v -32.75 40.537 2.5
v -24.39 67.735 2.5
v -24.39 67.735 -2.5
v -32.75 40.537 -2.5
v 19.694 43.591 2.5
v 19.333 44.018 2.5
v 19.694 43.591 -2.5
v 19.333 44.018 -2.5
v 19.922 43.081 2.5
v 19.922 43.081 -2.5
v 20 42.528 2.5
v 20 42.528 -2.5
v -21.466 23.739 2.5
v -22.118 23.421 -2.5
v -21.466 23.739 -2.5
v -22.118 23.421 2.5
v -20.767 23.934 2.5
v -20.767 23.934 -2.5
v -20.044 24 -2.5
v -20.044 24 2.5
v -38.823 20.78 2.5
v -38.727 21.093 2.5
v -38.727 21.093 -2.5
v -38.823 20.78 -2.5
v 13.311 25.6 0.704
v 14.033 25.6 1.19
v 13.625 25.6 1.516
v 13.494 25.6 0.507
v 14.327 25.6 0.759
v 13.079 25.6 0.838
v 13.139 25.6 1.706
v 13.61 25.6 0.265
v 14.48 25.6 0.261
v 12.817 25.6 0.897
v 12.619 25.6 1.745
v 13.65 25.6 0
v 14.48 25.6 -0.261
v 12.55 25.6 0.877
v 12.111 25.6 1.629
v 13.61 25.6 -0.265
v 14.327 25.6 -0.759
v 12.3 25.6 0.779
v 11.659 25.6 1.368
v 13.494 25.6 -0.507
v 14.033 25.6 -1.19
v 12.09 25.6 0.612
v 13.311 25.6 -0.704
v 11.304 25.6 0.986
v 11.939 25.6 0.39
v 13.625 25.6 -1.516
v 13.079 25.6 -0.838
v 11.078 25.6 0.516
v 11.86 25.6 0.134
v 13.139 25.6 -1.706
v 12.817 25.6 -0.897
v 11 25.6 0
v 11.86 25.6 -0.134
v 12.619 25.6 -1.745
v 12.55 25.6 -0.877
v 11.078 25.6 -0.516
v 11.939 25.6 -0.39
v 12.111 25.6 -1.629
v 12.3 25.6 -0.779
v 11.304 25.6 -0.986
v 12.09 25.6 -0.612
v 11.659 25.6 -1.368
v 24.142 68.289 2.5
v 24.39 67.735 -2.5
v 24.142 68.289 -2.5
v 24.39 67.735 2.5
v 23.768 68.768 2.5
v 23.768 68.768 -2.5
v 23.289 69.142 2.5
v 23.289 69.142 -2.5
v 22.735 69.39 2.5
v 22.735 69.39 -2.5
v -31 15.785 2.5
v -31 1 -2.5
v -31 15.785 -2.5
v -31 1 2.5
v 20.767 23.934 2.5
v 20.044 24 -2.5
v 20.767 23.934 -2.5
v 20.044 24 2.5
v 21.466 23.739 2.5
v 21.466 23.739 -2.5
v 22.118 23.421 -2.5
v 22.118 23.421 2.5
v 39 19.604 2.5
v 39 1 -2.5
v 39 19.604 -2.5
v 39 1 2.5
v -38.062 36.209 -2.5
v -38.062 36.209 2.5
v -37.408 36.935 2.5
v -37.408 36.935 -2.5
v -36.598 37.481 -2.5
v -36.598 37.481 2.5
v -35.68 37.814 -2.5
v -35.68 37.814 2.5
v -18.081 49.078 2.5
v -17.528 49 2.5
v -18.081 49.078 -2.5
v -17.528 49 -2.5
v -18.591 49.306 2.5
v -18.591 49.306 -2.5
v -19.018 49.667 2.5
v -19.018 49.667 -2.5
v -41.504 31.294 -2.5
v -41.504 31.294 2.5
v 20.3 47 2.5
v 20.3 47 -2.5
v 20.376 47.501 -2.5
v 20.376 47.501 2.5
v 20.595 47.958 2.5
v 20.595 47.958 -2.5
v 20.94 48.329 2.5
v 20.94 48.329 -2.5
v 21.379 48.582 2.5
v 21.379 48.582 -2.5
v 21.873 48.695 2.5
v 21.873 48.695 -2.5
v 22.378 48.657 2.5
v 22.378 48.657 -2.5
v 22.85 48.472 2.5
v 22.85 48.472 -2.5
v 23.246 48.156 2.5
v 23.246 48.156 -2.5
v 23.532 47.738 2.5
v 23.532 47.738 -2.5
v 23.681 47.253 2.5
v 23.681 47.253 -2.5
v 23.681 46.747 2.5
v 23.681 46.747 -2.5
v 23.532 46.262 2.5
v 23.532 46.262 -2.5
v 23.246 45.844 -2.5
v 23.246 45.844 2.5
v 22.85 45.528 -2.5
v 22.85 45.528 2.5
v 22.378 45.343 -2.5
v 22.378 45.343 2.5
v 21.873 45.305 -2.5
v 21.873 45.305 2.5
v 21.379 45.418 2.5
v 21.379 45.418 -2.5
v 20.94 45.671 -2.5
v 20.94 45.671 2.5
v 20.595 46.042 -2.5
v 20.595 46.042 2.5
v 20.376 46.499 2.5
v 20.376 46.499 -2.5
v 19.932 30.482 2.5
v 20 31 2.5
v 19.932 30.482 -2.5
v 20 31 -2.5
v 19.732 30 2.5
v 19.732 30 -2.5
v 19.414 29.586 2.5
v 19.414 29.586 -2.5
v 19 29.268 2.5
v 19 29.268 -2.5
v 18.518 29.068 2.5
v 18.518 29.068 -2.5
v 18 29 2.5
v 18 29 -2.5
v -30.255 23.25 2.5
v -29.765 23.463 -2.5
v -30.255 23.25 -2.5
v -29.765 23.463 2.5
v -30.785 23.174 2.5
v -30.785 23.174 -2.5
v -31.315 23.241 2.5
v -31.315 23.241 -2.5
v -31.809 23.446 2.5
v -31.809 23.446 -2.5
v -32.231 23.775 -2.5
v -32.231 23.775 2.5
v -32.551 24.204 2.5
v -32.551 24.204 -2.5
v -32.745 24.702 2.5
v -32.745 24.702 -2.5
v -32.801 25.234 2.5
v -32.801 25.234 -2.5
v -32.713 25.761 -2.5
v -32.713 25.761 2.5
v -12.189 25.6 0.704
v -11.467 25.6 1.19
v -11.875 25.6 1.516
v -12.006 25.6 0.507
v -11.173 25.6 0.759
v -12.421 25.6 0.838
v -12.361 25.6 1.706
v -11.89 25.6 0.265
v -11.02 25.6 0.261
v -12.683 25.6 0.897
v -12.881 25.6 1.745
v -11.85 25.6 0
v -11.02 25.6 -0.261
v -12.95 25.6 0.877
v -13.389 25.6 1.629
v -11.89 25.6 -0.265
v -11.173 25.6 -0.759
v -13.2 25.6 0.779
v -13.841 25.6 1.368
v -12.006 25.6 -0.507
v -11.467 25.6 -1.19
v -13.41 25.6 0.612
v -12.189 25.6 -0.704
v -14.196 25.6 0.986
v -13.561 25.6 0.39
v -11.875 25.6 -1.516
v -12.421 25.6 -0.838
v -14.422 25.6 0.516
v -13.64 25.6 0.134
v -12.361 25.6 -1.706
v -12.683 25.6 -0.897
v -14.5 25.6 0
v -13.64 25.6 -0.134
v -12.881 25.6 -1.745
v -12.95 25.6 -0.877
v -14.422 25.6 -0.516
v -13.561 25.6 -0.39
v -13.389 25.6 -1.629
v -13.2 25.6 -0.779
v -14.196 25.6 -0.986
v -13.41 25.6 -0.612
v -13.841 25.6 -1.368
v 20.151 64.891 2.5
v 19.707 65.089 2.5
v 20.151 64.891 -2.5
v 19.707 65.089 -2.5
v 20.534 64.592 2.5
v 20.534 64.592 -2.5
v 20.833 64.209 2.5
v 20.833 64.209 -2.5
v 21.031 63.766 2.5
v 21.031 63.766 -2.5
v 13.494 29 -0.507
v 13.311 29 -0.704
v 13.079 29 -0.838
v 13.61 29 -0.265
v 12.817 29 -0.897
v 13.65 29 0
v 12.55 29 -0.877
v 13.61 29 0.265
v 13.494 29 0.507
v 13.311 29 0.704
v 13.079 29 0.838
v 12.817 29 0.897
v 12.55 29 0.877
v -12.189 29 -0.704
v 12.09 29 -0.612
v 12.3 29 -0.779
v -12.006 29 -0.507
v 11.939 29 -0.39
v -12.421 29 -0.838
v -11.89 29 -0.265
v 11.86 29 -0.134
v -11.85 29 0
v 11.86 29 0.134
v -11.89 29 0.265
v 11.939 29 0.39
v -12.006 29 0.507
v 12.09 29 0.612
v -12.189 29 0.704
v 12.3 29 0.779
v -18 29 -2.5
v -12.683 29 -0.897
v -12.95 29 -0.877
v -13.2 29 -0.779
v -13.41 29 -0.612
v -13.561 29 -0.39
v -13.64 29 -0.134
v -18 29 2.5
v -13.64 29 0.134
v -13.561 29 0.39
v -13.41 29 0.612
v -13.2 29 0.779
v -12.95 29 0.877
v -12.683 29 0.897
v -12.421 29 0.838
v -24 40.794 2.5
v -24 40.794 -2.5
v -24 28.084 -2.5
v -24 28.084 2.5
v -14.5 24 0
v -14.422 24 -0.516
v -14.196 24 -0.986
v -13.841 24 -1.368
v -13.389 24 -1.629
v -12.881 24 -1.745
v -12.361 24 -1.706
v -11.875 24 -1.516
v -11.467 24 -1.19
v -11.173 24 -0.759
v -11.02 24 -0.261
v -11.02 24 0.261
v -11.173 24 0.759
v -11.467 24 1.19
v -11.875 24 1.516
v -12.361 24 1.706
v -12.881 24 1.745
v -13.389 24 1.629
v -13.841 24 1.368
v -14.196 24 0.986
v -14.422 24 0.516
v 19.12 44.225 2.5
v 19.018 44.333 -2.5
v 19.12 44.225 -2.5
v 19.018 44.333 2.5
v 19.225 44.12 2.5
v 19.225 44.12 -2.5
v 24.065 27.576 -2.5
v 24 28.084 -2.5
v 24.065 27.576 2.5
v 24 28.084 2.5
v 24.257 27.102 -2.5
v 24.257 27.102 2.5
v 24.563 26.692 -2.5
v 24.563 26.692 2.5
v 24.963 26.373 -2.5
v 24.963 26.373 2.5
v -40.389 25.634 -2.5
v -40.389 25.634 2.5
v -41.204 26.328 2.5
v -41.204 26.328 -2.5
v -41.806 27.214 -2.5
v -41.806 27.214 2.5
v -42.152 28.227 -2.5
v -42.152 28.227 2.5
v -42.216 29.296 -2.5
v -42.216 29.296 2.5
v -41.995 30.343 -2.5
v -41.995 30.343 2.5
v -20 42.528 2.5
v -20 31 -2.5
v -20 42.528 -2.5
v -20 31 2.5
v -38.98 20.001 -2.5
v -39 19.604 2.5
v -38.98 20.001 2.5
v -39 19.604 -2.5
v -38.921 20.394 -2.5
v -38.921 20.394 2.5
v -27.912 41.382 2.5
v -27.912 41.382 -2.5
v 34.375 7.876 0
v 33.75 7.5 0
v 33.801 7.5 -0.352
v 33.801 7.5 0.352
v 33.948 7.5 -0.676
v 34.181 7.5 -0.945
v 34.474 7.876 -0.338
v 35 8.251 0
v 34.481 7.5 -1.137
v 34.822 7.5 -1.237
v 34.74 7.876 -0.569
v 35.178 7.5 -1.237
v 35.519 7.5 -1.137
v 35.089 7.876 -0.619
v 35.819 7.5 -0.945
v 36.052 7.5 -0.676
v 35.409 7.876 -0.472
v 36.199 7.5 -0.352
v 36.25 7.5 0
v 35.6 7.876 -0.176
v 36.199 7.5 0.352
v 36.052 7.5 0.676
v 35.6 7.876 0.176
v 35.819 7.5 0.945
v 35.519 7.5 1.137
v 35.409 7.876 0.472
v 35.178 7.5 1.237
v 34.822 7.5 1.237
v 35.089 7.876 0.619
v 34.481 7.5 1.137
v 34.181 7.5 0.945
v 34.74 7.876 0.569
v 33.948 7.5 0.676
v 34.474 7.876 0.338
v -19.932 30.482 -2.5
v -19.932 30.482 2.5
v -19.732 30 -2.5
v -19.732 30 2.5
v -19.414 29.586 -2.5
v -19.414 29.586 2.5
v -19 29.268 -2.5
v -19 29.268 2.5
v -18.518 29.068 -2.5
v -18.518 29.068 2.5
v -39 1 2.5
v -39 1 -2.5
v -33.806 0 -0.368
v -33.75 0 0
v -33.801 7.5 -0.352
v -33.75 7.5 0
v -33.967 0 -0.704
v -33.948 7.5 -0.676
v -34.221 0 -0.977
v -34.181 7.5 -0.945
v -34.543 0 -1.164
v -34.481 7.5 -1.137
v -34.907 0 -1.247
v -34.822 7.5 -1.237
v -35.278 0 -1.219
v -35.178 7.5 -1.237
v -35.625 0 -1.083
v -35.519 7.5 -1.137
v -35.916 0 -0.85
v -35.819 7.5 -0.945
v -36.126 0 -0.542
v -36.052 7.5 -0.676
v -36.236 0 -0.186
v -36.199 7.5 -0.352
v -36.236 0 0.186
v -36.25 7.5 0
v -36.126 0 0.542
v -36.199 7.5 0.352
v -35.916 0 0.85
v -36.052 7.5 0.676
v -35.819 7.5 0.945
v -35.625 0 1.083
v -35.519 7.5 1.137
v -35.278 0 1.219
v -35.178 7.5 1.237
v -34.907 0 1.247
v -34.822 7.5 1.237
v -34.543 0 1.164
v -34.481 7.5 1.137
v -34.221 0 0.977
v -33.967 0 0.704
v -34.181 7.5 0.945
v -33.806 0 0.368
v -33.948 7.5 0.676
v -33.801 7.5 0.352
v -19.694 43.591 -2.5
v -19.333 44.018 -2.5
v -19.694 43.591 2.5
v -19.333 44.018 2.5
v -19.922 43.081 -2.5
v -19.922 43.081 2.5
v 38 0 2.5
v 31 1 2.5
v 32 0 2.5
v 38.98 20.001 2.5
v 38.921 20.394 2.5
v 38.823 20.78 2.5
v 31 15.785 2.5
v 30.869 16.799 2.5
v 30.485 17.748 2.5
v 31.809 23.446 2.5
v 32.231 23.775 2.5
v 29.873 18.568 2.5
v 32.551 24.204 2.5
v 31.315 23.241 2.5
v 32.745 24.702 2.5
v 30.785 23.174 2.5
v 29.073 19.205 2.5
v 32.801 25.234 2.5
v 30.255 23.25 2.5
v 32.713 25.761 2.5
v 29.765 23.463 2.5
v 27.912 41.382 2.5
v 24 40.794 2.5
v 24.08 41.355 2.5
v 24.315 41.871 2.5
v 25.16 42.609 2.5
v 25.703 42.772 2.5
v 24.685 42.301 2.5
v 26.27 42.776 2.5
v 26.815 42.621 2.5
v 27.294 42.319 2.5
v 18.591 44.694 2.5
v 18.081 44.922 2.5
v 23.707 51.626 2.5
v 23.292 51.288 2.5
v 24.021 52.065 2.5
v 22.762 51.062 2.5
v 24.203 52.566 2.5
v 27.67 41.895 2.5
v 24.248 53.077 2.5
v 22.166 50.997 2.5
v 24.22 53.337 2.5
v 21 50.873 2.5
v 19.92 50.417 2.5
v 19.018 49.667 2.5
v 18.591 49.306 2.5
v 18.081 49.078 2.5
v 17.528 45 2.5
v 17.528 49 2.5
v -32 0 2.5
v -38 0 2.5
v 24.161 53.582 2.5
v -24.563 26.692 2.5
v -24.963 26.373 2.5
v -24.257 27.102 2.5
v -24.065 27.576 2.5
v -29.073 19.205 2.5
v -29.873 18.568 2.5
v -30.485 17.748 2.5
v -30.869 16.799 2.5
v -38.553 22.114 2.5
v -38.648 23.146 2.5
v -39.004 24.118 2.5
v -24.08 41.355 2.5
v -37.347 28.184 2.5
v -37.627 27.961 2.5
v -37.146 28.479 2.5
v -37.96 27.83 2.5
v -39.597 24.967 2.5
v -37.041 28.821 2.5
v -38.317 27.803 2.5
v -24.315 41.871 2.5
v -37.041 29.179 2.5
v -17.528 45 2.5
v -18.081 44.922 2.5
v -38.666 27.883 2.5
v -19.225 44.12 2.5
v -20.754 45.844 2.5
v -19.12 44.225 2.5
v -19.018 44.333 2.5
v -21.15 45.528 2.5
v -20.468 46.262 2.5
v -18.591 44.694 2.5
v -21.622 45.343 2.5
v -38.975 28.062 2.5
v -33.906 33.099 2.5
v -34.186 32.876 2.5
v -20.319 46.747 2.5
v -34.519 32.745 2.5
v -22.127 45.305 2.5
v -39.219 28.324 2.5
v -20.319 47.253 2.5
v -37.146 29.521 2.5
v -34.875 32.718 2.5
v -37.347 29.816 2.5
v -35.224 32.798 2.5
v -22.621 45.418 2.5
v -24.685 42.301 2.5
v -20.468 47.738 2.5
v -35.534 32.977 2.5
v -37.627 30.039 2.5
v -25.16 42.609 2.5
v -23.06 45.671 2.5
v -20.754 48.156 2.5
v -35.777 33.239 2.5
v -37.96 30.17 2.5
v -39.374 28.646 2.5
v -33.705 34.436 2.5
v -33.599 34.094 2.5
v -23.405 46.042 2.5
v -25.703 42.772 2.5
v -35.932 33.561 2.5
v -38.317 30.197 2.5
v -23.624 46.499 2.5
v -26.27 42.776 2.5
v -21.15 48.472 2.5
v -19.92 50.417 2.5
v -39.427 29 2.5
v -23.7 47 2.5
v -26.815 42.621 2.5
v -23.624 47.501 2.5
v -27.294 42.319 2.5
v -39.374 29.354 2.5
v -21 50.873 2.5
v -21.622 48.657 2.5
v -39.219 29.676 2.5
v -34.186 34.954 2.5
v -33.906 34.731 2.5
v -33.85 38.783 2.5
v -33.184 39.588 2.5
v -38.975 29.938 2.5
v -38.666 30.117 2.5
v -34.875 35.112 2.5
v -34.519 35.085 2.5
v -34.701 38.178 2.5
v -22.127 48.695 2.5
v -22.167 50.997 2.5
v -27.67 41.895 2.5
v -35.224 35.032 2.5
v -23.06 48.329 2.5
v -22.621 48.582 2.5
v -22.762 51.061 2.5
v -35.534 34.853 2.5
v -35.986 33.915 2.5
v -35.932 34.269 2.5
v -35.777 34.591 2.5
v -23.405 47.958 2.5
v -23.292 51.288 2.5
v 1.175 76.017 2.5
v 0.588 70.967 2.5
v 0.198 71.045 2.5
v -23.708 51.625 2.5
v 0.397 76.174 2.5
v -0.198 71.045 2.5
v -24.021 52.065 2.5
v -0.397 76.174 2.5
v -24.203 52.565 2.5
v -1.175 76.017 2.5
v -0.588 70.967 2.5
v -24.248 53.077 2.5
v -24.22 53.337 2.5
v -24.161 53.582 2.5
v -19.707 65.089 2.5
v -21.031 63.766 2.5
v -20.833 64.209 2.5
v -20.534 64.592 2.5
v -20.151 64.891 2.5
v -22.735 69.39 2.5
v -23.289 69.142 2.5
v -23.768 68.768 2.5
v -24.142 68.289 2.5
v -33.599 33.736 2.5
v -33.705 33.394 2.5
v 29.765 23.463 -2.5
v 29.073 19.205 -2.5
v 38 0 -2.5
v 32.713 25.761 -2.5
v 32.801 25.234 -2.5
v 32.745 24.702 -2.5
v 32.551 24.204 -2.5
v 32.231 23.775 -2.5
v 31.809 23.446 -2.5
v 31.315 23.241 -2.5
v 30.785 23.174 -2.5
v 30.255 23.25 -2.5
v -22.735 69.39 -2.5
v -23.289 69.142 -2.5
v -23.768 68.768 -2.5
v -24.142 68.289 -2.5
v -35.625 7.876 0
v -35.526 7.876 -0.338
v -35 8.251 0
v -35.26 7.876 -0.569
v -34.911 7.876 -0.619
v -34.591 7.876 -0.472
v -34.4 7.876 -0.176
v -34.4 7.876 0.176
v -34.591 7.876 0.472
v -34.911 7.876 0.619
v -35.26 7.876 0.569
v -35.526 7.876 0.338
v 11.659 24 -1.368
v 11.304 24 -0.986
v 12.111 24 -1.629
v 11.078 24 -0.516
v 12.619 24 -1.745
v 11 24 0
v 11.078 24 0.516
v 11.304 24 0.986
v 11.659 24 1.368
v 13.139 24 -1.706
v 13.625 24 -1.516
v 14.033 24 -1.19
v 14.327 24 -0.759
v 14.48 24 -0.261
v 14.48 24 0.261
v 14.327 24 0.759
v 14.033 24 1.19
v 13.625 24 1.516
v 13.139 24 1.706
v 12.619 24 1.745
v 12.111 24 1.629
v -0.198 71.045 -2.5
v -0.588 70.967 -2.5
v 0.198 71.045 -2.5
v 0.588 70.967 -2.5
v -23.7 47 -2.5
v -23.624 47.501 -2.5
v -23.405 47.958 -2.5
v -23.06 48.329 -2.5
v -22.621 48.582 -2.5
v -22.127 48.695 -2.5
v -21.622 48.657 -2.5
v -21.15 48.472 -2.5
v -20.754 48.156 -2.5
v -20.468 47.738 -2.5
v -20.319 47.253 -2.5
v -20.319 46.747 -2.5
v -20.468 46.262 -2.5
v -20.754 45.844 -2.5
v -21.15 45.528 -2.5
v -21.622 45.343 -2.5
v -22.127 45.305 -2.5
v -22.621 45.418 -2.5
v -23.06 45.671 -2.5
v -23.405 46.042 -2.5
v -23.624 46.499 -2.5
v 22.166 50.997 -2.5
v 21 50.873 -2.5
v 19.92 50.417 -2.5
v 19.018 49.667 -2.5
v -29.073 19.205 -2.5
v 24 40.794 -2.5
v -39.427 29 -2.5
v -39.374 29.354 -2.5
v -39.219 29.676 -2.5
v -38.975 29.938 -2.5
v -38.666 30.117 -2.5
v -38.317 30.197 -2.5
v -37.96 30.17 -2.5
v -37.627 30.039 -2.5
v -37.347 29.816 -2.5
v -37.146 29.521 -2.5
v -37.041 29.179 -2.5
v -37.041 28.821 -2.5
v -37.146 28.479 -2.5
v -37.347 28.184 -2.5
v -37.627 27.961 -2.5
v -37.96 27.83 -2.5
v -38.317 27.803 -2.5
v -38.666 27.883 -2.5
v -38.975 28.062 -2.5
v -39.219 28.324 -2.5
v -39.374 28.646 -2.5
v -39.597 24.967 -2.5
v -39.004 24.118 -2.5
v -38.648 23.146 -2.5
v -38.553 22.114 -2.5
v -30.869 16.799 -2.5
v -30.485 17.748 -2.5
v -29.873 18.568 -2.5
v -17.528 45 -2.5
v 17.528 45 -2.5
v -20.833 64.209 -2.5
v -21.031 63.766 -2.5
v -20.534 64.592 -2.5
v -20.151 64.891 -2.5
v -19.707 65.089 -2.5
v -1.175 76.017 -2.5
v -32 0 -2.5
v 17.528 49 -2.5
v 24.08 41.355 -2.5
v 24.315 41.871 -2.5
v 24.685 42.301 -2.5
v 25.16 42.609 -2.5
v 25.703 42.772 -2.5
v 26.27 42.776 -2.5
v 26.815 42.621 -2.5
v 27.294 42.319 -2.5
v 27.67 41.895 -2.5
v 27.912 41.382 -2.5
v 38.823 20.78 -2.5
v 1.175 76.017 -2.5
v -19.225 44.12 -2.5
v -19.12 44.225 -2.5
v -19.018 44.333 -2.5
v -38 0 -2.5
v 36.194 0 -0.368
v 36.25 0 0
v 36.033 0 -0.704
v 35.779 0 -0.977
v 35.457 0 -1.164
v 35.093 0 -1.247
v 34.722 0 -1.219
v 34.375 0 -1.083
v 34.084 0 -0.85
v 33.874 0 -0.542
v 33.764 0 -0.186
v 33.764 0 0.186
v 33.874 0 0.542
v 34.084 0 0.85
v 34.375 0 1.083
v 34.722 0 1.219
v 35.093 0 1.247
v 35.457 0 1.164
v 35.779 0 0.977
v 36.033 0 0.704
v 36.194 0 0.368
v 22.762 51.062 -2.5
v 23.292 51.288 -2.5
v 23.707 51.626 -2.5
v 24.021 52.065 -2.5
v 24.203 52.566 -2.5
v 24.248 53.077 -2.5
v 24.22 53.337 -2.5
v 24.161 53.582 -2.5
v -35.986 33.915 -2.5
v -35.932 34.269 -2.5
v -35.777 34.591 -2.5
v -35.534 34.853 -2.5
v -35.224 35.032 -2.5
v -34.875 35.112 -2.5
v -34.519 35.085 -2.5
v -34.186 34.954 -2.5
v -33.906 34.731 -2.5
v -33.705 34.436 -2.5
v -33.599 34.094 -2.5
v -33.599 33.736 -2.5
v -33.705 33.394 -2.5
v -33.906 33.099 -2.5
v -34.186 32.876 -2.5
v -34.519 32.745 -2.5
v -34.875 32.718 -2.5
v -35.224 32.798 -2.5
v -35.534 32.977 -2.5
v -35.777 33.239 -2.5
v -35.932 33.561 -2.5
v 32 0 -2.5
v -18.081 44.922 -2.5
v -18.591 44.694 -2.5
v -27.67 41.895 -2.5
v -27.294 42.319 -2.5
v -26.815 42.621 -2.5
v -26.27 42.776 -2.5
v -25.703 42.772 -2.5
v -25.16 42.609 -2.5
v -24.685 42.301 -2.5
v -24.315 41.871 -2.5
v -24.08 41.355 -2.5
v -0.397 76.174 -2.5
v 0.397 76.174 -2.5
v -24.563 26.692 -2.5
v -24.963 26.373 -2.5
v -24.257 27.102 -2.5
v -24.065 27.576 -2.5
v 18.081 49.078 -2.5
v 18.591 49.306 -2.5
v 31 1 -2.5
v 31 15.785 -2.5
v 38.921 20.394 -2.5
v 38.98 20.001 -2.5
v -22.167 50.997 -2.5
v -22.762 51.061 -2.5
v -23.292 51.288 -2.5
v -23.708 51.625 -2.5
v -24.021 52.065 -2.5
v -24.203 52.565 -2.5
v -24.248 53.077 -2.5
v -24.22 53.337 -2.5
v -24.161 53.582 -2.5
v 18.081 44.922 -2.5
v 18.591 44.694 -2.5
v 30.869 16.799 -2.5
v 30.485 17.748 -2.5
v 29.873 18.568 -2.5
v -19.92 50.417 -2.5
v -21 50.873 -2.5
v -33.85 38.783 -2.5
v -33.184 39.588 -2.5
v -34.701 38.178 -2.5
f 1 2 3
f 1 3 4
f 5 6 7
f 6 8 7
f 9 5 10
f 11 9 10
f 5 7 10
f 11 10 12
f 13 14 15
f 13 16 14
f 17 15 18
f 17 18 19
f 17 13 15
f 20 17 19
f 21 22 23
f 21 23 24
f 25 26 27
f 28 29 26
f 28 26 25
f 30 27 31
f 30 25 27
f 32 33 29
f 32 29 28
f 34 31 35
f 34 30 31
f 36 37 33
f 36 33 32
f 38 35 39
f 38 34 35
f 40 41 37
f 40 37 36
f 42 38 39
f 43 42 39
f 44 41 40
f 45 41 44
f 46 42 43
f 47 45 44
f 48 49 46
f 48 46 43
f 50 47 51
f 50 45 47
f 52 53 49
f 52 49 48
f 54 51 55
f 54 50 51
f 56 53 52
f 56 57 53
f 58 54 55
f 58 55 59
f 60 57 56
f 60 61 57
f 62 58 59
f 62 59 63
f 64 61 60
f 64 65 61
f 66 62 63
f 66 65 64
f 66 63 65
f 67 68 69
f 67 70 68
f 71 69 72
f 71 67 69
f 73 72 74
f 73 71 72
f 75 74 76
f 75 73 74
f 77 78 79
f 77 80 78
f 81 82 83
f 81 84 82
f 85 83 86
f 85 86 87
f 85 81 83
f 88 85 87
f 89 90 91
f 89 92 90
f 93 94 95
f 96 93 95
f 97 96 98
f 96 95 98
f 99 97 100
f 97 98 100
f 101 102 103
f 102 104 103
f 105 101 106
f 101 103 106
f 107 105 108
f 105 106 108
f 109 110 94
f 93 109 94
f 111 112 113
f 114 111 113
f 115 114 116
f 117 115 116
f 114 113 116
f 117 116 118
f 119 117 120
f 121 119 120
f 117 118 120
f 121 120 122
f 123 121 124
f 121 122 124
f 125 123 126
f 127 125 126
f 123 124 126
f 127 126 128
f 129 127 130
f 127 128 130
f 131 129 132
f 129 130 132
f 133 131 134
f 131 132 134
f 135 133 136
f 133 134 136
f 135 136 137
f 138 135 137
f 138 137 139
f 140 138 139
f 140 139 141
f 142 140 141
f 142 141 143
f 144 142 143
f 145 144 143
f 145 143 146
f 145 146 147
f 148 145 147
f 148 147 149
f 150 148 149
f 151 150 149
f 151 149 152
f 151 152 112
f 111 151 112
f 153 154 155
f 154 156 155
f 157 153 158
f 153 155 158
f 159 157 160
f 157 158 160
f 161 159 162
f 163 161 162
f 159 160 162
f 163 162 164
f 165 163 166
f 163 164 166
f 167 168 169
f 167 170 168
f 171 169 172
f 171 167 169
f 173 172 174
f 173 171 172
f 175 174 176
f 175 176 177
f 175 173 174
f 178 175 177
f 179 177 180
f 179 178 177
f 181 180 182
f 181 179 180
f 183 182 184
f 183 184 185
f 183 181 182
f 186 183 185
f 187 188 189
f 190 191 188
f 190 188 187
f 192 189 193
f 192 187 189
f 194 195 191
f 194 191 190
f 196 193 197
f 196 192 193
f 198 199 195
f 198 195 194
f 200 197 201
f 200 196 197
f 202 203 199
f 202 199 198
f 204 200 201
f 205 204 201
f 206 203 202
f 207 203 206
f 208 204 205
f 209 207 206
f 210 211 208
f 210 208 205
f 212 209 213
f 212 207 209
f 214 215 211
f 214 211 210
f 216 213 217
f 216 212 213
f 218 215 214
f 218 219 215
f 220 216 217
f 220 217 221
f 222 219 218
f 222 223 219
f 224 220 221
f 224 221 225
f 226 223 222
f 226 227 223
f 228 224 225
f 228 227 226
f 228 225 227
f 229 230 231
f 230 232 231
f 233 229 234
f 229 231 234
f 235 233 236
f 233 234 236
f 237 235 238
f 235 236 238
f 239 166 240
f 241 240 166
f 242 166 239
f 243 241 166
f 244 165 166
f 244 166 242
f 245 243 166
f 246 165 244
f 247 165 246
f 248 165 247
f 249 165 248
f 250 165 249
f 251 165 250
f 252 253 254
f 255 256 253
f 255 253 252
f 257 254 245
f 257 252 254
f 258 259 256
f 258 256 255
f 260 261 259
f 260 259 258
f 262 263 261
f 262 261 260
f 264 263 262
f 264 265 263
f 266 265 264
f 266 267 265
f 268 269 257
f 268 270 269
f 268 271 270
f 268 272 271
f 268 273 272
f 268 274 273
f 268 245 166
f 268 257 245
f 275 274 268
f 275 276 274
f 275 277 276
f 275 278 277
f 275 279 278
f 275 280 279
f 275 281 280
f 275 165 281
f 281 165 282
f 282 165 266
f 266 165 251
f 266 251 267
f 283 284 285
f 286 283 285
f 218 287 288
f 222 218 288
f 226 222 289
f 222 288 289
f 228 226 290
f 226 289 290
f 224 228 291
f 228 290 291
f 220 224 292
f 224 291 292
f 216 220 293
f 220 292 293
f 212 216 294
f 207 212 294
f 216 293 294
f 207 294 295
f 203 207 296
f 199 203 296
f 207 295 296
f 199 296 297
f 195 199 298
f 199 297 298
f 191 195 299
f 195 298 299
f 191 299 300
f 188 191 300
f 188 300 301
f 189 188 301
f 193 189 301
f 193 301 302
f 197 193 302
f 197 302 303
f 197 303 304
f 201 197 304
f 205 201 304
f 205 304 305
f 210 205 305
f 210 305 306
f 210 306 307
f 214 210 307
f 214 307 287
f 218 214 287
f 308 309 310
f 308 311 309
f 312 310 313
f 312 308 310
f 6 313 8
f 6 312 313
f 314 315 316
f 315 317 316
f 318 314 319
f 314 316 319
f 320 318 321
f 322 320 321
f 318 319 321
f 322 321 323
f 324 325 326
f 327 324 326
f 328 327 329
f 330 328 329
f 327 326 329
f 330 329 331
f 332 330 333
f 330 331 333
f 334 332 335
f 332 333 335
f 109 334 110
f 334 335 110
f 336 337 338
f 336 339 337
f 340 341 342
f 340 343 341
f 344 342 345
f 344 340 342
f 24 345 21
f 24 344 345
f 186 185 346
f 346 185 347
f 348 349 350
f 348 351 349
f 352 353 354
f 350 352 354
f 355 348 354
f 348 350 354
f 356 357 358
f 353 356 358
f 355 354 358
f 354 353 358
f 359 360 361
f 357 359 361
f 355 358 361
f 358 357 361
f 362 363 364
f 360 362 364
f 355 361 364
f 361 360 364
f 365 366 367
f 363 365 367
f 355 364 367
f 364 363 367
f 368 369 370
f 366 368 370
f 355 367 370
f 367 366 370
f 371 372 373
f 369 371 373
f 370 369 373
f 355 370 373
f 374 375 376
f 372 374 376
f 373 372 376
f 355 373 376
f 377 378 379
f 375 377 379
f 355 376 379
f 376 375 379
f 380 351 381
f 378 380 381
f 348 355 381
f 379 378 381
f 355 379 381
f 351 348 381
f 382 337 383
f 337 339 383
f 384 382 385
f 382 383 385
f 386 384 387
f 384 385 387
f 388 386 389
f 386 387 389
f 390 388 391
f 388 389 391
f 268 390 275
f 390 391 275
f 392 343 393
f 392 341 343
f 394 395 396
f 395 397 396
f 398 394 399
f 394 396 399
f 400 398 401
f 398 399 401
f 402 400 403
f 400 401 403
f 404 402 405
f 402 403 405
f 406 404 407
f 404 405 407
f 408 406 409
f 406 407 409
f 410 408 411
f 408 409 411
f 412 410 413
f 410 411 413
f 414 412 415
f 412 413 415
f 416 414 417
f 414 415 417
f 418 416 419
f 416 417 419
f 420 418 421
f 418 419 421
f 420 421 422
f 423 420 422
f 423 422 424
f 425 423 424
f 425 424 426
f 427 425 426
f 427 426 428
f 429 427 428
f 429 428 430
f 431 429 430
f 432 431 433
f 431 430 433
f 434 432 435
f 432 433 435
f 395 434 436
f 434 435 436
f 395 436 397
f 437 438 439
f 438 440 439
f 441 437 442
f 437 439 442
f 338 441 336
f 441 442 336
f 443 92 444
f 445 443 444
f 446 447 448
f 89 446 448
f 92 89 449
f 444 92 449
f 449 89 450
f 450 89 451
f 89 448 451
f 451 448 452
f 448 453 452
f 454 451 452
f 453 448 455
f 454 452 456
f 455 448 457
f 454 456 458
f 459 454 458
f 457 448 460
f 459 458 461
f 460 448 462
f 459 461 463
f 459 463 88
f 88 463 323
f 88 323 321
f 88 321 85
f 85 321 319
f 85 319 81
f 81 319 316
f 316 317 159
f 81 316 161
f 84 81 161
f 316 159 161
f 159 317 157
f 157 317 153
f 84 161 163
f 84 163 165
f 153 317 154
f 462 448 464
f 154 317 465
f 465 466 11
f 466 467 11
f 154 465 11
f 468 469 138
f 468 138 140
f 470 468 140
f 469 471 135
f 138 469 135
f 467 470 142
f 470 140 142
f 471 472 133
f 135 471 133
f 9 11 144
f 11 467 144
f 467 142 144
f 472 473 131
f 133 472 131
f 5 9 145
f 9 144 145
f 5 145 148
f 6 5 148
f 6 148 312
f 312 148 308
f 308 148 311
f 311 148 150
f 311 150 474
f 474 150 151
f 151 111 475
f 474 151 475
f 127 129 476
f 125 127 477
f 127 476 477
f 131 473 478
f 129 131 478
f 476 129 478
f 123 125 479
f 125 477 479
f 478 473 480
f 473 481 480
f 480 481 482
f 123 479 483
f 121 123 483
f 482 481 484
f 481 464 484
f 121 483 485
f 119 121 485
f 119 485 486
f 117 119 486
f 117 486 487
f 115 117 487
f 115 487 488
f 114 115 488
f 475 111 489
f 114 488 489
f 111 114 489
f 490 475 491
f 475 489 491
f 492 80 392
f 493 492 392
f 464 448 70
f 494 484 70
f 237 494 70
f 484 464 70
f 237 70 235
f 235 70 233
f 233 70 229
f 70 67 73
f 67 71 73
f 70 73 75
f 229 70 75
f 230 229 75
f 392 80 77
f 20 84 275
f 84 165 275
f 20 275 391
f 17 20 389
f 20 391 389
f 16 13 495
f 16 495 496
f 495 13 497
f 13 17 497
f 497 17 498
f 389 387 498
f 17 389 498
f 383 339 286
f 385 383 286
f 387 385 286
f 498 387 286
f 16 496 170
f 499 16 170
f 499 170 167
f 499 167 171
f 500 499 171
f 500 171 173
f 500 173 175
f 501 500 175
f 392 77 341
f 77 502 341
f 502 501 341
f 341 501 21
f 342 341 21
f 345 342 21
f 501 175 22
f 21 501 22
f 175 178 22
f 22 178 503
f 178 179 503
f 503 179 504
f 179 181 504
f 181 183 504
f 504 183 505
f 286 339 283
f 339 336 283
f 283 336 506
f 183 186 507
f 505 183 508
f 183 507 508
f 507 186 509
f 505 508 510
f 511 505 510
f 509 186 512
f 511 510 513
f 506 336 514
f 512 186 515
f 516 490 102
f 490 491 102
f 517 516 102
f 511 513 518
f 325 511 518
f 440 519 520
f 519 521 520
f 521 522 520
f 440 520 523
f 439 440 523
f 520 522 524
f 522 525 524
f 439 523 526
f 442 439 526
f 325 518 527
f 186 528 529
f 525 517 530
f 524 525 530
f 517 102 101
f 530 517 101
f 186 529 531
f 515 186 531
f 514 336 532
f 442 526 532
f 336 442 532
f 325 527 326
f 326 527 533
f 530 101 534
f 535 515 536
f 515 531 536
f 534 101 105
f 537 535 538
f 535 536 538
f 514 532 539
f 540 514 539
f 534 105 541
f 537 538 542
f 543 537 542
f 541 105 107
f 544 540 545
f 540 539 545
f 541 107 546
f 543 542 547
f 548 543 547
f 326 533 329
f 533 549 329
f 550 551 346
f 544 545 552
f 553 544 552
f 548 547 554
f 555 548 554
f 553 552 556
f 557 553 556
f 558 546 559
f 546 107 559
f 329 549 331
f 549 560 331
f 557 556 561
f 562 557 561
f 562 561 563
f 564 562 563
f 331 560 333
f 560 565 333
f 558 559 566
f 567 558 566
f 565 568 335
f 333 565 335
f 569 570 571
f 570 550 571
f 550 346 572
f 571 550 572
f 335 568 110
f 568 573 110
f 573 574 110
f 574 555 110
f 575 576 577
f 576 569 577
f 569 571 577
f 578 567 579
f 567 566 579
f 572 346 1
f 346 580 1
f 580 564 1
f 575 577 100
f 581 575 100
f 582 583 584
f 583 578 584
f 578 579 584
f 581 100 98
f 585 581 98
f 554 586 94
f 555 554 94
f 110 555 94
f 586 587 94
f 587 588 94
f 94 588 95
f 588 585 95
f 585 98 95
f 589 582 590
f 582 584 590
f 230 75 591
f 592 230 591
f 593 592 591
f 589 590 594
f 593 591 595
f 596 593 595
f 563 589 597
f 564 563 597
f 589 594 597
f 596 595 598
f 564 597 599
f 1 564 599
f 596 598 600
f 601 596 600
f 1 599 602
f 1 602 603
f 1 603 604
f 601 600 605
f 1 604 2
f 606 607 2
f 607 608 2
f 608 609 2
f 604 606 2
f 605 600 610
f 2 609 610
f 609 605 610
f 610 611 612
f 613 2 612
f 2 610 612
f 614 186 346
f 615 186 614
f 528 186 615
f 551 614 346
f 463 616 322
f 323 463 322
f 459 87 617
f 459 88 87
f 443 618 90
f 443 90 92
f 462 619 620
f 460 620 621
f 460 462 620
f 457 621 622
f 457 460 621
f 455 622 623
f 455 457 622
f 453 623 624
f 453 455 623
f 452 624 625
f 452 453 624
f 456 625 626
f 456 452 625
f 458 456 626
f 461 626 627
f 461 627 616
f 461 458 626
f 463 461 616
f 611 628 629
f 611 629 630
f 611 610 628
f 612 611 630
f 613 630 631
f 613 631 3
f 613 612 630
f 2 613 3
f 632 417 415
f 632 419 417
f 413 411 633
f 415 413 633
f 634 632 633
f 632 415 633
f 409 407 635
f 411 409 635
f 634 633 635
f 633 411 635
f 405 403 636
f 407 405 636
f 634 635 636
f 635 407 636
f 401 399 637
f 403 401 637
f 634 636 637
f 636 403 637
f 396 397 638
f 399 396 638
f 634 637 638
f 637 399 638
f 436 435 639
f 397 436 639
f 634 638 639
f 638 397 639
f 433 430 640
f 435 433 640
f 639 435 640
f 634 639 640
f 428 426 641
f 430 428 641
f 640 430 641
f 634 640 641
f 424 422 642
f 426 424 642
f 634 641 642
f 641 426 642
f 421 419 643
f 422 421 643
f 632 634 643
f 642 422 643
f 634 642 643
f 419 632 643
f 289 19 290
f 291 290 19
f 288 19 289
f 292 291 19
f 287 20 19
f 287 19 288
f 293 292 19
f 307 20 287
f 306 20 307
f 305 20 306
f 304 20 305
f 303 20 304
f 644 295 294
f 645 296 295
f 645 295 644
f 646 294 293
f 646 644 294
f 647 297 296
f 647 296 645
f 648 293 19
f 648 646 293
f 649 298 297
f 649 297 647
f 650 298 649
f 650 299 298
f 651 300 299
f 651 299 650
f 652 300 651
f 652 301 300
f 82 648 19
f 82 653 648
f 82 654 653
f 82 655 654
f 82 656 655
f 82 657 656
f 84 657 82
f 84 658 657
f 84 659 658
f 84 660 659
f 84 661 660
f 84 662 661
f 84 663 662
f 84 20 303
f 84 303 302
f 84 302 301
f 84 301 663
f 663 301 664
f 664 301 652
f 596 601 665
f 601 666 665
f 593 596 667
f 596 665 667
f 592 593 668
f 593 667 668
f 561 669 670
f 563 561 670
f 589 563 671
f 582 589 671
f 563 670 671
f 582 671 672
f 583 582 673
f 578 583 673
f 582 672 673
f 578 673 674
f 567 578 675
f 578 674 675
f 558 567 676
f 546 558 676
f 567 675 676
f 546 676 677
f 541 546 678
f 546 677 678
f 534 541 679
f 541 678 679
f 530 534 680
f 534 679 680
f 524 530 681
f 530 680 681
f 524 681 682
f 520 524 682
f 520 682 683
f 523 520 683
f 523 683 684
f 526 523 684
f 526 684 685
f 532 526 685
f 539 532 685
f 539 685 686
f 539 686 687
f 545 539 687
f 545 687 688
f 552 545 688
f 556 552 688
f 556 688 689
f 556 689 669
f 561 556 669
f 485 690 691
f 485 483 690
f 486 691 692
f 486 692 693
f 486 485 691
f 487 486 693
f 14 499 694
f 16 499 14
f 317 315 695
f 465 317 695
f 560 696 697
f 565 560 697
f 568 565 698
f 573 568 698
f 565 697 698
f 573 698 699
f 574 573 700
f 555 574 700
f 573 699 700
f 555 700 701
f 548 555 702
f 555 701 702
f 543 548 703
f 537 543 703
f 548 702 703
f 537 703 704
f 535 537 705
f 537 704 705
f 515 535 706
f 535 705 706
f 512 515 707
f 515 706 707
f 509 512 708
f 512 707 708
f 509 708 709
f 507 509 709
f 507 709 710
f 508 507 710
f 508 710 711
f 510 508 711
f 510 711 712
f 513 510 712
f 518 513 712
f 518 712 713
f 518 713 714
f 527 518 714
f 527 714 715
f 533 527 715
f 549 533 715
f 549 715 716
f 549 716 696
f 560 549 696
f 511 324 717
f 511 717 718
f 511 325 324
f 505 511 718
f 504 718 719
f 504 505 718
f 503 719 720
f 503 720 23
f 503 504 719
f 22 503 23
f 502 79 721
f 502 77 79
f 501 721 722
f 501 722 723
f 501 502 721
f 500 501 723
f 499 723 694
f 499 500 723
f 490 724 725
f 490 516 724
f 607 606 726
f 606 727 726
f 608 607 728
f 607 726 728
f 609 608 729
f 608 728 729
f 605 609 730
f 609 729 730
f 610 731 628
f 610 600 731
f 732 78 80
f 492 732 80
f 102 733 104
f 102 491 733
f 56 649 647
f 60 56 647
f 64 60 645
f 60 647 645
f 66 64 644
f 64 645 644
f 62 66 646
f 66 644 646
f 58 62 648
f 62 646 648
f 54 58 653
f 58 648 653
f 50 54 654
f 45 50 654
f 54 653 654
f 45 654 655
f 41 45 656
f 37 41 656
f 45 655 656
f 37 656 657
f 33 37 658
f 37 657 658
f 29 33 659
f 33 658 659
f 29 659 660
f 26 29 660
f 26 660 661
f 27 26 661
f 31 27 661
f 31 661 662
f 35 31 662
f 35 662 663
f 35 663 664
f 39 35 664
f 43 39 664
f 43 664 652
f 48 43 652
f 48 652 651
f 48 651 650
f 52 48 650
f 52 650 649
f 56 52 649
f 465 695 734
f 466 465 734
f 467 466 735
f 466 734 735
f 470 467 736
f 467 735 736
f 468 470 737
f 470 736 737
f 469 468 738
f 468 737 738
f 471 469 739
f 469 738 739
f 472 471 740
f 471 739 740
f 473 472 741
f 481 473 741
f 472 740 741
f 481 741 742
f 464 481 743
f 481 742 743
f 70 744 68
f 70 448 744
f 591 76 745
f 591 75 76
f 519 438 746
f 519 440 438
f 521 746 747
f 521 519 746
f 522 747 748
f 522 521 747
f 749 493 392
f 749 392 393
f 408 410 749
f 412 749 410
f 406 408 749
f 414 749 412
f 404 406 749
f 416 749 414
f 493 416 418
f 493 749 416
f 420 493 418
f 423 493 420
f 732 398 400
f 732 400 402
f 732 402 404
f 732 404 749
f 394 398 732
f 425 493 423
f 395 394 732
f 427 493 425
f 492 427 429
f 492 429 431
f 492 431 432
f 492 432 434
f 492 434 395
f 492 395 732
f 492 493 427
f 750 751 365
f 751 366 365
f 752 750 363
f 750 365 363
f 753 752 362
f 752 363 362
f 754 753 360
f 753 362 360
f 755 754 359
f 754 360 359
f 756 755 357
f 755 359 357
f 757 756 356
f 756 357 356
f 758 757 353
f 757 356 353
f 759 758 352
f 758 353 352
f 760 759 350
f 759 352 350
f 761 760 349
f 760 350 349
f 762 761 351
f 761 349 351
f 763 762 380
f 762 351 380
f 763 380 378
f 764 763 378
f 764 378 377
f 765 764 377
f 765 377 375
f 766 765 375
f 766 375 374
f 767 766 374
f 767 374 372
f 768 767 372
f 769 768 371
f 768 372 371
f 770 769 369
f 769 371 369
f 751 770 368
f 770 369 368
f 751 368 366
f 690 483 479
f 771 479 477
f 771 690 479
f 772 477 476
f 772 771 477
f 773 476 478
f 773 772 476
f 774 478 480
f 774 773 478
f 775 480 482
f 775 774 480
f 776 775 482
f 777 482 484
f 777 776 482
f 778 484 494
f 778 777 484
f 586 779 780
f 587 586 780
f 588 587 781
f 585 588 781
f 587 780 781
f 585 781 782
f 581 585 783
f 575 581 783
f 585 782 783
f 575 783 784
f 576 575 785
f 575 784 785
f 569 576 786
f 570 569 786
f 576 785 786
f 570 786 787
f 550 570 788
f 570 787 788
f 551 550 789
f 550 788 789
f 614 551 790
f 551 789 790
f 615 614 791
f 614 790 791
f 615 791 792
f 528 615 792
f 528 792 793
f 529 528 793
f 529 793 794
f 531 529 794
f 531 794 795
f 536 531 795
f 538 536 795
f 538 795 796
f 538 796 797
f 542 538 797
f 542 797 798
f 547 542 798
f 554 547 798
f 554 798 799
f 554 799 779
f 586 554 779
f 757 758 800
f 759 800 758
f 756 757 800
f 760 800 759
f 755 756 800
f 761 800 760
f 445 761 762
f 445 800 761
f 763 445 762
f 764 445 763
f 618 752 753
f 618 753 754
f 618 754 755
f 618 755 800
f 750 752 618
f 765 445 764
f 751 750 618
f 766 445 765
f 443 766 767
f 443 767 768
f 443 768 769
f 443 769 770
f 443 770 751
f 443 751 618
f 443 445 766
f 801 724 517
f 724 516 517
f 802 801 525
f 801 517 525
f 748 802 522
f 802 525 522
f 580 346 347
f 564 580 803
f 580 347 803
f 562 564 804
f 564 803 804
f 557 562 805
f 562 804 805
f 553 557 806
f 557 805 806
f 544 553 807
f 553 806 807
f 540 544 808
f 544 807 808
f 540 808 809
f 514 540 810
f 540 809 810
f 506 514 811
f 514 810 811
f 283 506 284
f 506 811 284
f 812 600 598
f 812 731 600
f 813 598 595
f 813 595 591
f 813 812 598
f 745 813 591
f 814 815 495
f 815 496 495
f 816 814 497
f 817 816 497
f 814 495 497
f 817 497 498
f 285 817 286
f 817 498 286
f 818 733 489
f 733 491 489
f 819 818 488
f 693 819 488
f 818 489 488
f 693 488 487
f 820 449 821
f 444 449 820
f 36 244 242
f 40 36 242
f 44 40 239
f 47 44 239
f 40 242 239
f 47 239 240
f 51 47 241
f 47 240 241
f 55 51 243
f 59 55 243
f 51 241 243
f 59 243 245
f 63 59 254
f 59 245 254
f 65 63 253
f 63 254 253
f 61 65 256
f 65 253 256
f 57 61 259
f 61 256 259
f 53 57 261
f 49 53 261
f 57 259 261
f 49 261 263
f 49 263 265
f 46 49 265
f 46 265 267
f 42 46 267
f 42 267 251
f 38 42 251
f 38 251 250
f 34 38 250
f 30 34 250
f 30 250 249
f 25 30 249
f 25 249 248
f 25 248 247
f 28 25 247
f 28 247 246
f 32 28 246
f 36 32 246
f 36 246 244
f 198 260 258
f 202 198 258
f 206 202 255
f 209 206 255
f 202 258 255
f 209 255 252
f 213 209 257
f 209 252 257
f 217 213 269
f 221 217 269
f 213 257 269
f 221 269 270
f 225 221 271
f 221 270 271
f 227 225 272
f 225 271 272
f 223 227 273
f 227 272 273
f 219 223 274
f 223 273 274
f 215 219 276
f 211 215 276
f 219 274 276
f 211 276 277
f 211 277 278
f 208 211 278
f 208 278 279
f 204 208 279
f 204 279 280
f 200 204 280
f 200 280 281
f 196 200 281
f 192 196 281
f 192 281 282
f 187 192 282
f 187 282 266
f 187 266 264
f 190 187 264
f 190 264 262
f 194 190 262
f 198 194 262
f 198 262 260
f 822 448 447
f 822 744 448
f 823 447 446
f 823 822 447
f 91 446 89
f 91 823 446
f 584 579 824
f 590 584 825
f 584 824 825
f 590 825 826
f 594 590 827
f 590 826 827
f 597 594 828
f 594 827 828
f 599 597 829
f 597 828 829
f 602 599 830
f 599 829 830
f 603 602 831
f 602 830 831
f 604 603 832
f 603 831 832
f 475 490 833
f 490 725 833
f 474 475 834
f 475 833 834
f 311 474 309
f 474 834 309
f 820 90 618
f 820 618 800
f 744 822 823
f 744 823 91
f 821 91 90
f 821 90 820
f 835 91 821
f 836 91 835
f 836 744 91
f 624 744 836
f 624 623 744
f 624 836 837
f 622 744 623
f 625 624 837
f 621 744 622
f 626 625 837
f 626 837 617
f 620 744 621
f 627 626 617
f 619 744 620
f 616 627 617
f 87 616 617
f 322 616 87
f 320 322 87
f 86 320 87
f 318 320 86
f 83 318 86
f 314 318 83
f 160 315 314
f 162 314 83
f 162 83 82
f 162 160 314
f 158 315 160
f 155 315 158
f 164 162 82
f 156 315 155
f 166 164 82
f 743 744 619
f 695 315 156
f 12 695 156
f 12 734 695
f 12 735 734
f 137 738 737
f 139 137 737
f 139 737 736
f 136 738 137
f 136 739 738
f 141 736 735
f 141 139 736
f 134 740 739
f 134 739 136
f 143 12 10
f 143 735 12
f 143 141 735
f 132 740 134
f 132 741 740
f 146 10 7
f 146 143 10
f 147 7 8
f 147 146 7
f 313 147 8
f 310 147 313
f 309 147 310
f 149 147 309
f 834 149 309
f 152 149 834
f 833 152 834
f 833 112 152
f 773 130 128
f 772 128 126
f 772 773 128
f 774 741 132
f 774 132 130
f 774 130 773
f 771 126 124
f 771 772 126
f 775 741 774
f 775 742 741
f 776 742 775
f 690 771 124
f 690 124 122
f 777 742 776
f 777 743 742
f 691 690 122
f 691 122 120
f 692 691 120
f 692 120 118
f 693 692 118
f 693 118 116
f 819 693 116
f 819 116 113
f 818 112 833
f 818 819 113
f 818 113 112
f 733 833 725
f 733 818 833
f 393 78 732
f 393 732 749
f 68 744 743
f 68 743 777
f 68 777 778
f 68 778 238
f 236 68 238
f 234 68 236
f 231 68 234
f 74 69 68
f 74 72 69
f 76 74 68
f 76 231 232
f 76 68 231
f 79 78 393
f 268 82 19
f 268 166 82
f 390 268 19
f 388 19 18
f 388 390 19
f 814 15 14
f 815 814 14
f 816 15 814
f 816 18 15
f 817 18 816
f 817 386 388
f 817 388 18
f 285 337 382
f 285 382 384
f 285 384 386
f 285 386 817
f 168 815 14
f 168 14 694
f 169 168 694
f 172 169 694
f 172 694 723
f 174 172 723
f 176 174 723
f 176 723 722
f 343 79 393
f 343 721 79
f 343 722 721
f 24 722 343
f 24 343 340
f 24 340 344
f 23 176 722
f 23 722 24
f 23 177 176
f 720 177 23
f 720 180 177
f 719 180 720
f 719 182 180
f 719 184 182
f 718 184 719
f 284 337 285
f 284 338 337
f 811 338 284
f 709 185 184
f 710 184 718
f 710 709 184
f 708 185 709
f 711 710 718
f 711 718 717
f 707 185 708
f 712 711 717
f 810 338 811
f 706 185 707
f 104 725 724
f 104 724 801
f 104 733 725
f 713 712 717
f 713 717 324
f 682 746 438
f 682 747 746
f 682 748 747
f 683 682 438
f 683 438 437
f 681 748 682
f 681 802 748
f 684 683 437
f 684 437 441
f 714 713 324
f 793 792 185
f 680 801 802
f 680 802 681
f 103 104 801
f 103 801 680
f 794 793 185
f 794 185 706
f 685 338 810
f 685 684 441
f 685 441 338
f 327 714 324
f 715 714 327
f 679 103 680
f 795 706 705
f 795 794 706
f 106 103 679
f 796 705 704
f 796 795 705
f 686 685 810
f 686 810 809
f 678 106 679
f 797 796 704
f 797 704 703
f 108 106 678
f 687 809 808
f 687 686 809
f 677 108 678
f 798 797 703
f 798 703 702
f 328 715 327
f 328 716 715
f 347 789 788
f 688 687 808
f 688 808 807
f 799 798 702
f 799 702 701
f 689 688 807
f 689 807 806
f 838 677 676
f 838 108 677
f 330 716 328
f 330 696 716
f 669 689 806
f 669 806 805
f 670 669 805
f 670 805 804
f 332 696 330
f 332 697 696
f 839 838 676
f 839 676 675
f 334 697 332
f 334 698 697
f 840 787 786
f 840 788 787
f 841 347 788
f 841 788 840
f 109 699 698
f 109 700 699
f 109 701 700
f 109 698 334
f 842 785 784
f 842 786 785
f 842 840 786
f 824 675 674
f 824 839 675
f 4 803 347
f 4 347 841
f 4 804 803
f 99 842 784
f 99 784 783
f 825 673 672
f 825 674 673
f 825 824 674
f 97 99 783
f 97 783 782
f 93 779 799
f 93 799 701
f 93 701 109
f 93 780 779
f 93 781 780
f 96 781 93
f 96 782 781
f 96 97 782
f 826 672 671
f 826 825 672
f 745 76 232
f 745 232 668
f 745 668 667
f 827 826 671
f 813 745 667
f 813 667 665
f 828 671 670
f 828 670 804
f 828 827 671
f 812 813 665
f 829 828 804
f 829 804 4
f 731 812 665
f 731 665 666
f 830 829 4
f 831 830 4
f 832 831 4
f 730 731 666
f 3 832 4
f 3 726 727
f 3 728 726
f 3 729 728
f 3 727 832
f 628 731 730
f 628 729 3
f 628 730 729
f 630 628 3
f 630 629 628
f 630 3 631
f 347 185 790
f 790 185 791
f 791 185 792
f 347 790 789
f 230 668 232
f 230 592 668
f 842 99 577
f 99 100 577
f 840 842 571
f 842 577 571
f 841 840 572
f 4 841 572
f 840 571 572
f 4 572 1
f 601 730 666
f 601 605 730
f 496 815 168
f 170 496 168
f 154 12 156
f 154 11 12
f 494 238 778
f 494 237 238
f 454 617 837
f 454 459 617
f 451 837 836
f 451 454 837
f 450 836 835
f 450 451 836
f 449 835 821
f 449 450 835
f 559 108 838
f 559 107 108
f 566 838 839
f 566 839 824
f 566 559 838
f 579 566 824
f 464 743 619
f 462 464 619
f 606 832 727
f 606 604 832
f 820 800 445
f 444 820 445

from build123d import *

# Parameters (mm, degrees)
BOSS_EXTRUDE3_DEPTH              = 2.5
FILLET3_R                        = 2
CUT_EXTRUDE1_DEPTH               = 86.90473786
FILLET1_R                        = 2
FILLET2_R                        = 4
M3_CLEARANCE_HOLE1_D             = 3.4
M3X0_5_TAPPED_HOLE1_D            = 2.5
M3X0_5_TAPPED_HOLE1_DEPTH        = 7.5
M3X0_5_TAPPED_HOLE1_TIP          = 0.751075774
CHAMFER1_SIZE                    = 1
CBORE_FOR_M1_6_SHCS1_D           = 1.8
CBORE_FOR_M1_6_SHCS1_DEPTH       = 5
CBORE_FOR_M1_6_SHCS1_CBORE_D     = 3.5
CBORE_FOR_M1_6_SHCS1_CBORE_DEPTH = 1.6
BOSS_EXTRUDE4_DEPTH              = 5
FILLET4_R                        = 4
M2_CLEARANCE_HOLE1_D             = 2.4
M2_CLEARANCE_HOLE1_DEPTH         = 7.5
M2_CLEARANCE_HOLE1_TIP           = 0.721032743


with BuildPart() as part:
    # Sketch1 → Boss-Extrude3 (new, symmetric)
    with BuildSketch(Plane.XY):
        with BuildLine():
            Line((-39, 0), (-31, 0))
            Line((-31, 0), (-31, 18.037654982))
            Line((-31, 18.037654982), (-21.161883591, 24))
            Line((-21.161883591, 24), (21.161883591, 24))
            Line((21.161883591, 24), (31, 18.037654982))
            Line((31, 18.037654982), (31, 0))
            Line((31, 0), (39, 0))
            Line((39, 0), (39, 20.205165085))
            Line((39, 20.205165085), (24.389646385, 67.734568005))
            ThreePointArc((24.389646385, 67.734568005), (23.767766953, 68.767766953), (22.734568005, 69.389646385))
            Line((22.734568005, 69.389646385), (0, 76.378164175))
            Line((0, 76.378164175), (-22.734568005, 69.389646385))
            ThreePointArc((-22.734568005, 69.389646385), (-23.767766953, 68.767766953), (-24.389646385, 67.734568005))
            Line((-24.389646385, 67.734568005), (-39, 20.205165085))
            Line((-39, 20.205165085), (-39, 0))
        make_face()
        with BuildLine():
            Line((-20, 29), (-20, 43.535898385))
            ThreePointArc((-20, 43.535898385), (-19.171572875, 44.171572875), (-18.535898385, 45))
            Line((-18.535898385, 45), (18.535898385, 45))
            ThreePointArc((18.535898385, 45), (19.171572875, 44.171572875), (20, 43.535898385))
            Line((20, 43.535898385), (20, 29))
            Line((20, 29), (-20, 29))
        make_face(mode=Mode.SUBTRACT)
        with BuildLine():
            Line((18.535898385, 49), (-18.535898385, 49))
            ThreePointArc((-18.535898385, 49), (-22.449787583, 50.974630943), (-25.823434216, 48.175308809))
            Line((-25.823434216, 48.175308809), (-20.719808061, 64.77807629))
            Line((-20.719808061, 64.77807629), (0, 71.147264708))
            Line((0, 71.147264708), (20.719808061, 64.77807629))
            Line((20.719808061, 64.77807629), (25.823434216, 48.175308809))
            ThreePointArc((25.823434216, 48.175308809), (22.449787583, 50.974630943), (18.535898385, 49))
        make_face(mode=Mode.SUBTRACT)
    extrude(amount=BOSS_EXTRUDE3_DEPTH, both=True)

    # Fillet3
    fillet3_edges = [part.edges().sort_by_distance(p)[0] for p in [
        (-18.535898385, 45, 0),
        (-20, 43.535898385, 0),
        (-20, 29, 0),
        (20, 29, 0),
        (20, 43.535898385, 0),
        (18.535898385, 45, 0),
        (20.719808061, 64.77807629, 0),
        (0, 71.147264708, 0),
        (-20.719808061, 64.77807629, 0),
        (-25.823434216, 48.175308809, 0),
        (-18.535898385, 49, 0),
        (18.535898385, 49, 0),
    ]]
    fillet(fillet3_edges, radius=FILLET3_R - 0.0004)  # a hair under: the kernel refuses the full size
    fillet3_2_edges = [part.edges().sort_by_distance(p)[0] for p in [
        (25.823434216, 48.175308809, 0),
    ]]
    fillet(fillet3_2_edges, radius=FILLET3_R)

    # Sketch2 → Cut-Extrude1 (cut, through all)
    with BuildSketch(Plane(origin=(0, 0, -2.5), x_dir=(-1, 0, 0), z_dir=(0, 0, -1))):
        with BuildLine():
            Line((-27.911717108, 41.381849759), (-34.256545, 20.741289696))
            Line((-34.256545, 20.741289696), (-24, 26.957221429))
            Line((-24, 26.957221429), (-24, 40.794195355))
            ThreePointArc((-24, 40.794195355), (-25.702875629, 42.77200149), (-27.911717108, 41.381849759))
        make_face()
        with BuildLine():
            Line((24, 26.957221429), (34.256545, 20.741289696))
            Line((34.256545, 20.741289696), (27.911717108, 41.381849759))
            ThreePointArc((27.911717108, 41.381849759), (25.702875629, 42.77200149), (24, 40.794195355))
            Line((24, 40.794195355), (24, 26.957221429))
        make_face()
    extrude(amount=-CUT_EXTRUDE1_DEPTH, mode=Mode.SUBTRACT)

    # Fillet1
    fillet1_edges = [part.edges().sort_by_distance(p)[0] for p in [
        (24, 26.957221429, 0),
        (34.256545, 20.741289696, 0),
        (-34.256545, 20.741289696, 0),
        (-24, 26.957221429, 0),
    ]]
    fillet(fillet1_edges, radius=FILLET1_R)

    # Fillet2
    fillet2_edges = [part.edges().sort_by_distance(p)[0] for p in [
        (39, 20.205165085, 0),
        (31, 18.037654982, 0),
        (21.161883591, 24, 0),
        (-21.161883591, 24, 0),
        (-31, 18.037654982, 0),
        (-39, 20.205165085, 0),
        (0, 76.378164175, 0),
    ]]
    fillet(fillet2_edges, radius=FILLET2_R)

    # M3 Clearance Hole1 (through all)
    with Locations(Plane.XY.offset(2.5)):
        with Locations((-22, 47), (22, 47)):
            Hole(M3_CLEARANCE_HOLE1_D / 2)

    # M3x0.5 Tapped Hole1
    with Locations(Plane(origin=(0, 0, 0), x_dir=(-1, 0, 0), z_dir=(0, -1, 0))):
        with Locations((-35, 0), (35, 0)):
            Hole(M3X0_5_TAPPED_HOLE1_D / 2, depth=M3X0_5_TAPPED_HOLE1_DEPTH)
            with Locations((0, 0, -(M3X0_5_TAPPED_HOLE1_DEPTH + M3X0_5_TAPPED_HOLE1_TIP / 2))):  # 118° drill point
                Cone(0, M3X0_5_TAPPED_HOLE1_D / 2, M3X0_5_TAPPED_HOLE1_TIP, mode=Mode.SUBTRACT)

    # Chamfer1
    chamfer1_edges = [part.edges().sort_by_distance(p)[0] for p in [
        (39, 0, 0),
        (31, 0, 0),
        (-31, 0, 0),
        (-39, 0, 0),
    ]]
    chamfer(chamfer1_edges, length=CHAMFER1_SIZE)

    # CBORE for M1.6 SHCS1
    with Locations(Plane(origin=(0, 24, 0), x_dir=(-1, 0, 0), z_dir=(0, -1, 0))):
        with Locations((12.75, 0), (-12.75, 0)):
            CounterBoreHole(CBORE_FOR_M1_6_SHCS1_D / 2, CBORE_FOR_M1_6_SHCS1_CBORE_D / 2, CBORE_FOR_M1_6_SHCS1_CBORE_DEPTH, depth=CBORE_FOR_M1_6_SHCS1_DEPTH)

    # Sketch12 → Boss-Extrude4 (add)
    with BuildSketch(Plane.XY.offset(2.5)):
        with BuildLine():
            Line((-41.503743829, 31.294305745), (-38.062285211, 36.209218011))
            ThreePointArc((-38.062285211, 36.209218011), (-32.491371289, 37.191520443), (-31.509068857, 31.62060652))
            Line((-31.509068857, 31.62060652), (-34.950527475, 26.705694255))
            ThreePointArc((-34.950527475, 26.705694255), (-40.521441398, 25.723391823), (-41.503743829, 31.294305745))
        make_face()
    extrude(amount=-BOSS_EXTRUDE4_DEPTH)

    # Fillet4
    fillet4_edges = [part.edges().sort_by_distance(p)[0] for p in [
        (-33.610368225, 37.738346482, 0),
        (-37.505935548, 25.065553354, 0),
    ]]
    fillet(fillet4_edges, radius=FILLET4_R)

    # M2 Clearance Hole1
    with Locations(Plane.XY.offset(2.5)):
        with Locations((-38.227135652, 29), (-34.785677034, 33.914912266)):
            Hole(M2_CLEARANCE_HOLE1_D / 2, depth=M2_CLEARANCE_HOLE1_DEPTH)
            with Locations((0, 0, -(M2_CLEARANCE_HOLE1_DEPTH + M2_CLEARANCE_HOLE1_TIP / 2))):  # 118° drill point
                Cone(0, M2_CLEARANCE_HOLE1_D / 2, M2_CLEARANCE_HOLE1_TIP, mode=Mode.SUBTRACT)


solid = part.part
